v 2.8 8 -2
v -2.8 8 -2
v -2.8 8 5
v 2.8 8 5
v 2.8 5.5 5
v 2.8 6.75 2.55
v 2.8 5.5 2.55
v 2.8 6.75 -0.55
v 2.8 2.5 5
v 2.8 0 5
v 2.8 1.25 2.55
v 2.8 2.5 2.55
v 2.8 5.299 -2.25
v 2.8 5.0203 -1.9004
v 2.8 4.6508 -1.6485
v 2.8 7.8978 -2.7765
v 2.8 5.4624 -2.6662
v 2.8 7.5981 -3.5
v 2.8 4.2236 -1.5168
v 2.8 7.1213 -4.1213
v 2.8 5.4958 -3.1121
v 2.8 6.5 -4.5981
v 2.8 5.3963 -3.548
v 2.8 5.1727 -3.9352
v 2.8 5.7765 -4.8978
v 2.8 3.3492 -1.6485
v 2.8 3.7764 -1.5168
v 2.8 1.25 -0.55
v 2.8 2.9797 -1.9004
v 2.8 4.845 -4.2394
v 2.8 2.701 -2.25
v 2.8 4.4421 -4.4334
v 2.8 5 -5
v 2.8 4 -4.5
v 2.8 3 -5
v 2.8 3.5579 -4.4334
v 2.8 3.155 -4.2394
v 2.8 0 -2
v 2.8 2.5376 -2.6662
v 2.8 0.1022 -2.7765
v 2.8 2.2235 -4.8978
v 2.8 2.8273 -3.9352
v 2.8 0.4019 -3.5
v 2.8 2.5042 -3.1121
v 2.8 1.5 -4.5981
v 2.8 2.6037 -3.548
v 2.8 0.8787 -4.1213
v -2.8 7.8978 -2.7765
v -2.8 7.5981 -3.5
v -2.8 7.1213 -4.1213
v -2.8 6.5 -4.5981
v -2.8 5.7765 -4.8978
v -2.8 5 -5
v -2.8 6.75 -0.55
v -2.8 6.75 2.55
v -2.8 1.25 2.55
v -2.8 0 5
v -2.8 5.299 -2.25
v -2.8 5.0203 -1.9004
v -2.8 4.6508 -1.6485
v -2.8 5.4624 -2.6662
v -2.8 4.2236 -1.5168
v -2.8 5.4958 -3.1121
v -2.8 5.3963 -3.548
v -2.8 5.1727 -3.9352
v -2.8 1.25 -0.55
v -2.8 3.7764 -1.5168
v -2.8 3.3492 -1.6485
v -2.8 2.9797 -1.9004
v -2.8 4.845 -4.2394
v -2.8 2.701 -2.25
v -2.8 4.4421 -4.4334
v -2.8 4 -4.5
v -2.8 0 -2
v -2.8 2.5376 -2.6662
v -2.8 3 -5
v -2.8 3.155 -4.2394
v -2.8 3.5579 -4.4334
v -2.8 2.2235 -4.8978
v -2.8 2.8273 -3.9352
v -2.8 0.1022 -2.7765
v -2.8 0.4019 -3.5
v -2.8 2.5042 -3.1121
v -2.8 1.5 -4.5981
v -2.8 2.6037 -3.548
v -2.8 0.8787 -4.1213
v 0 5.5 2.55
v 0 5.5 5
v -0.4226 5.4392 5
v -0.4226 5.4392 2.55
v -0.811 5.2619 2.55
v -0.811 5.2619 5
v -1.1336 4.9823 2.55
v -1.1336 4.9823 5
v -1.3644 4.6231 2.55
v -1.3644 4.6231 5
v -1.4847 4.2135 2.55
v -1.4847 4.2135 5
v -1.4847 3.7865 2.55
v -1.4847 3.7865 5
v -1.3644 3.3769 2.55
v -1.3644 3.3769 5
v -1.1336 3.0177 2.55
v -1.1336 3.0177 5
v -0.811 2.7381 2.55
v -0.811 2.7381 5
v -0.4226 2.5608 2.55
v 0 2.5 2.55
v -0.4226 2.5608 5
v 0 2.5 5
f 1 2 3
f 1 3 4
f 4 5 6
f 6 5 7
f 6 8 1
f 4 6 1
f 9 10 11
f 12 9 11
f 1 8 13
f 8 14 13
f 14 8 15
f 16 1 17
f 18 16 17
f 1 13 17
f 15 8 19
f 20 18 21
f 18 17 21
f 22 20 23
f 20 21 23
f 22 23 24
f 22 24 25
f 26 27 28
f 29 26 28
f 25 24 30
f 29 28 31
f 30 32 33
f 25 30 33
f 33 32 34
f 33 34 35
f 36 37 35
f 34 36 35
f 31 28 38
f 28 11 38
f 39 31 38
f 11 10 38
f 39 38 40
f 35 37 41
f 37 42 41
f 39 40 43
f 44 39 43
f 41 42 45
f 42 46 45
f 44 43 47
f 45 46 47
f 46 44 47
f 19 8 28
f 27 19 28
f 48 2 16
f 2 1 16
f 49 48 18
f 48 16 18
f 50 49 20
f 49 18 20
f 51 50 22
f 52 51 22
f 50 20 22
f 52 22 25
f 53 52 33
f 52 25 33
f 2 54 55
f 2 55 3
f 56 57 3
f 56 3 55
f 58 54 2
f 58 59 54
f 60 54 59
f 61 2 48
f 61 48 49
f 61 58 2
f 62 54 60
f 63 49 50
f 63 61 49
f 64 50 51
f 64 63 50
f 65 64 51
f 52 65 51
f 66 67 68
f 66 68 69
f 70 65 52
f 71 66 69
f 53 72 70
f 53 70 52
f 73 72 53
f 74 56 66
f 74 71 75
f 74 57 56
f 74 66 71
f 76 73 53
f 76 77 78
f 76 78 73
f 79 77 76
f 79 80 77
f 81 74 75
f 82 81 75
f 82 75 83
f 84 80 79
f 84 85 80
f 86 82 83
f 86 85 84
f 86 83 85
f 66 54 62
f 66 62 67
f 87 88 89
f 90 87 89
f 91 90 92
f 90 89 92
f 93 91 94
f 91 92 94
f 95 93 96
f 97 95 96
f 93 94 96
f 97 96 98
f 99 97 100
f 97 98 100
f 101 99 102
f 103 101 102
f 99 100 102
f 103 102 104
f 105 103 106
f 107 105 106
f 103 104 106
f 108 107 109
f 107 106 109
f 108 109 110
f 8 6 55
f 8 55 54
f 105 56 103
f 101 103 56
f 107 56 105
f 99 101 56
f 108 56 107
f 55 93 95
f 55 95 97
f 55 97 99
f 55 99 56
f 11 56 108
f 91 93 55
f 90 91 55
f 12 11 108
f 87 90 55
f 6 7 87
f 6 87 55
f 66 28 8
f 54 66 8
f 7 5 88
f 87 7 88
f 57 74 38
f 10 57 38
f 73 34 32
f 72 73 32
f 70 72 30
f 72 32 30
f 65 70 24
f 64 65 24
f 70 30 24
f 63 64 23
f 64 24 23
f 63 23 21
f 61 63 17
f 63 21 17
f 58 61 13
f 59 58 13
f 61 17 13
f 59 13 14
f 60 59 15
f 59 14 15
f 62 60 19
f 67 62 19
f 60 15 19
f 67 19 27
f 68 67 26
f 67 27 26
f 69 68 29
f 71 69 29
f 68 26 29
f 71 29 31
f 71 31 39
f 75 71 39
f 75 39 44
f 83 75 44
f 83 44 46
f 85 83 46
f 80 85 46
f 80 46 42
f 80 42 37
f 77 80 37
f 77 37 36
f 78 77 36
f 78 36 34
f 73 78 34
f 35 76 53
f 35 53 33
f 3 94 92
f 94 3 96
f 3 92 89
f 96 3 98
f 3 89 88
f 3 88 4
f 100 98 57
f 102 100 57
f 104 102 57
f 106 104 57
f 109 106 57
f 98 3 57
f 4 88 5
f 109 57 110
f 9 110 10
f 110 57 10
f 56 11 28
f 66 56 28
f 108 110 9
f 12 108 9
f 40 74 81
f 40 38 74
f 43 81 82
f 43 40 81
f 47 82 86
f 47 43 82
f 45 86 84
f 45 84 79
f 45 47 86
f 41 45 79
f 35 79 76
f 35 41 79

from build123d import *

# Parameters (mm, degrees)
SKETCH_1_W          = 5.6
SKETCH_1_H          = 10
EXTRUDE_1_DEPTH     = 8
SKETCH_2_W          = 3.1
SKETCH_2_H          = 5.5
CUT_EXTRUDE_1_DEPTH = 11.970870522
CUT_EXTRUDE_2_REACH = 15.109
SKETCH_3_R          = 1.5
SKETCH_4_R          = 1.5
CUT_EXTRUDE_3_DEPTH = 11.970870522
FILLET_1_R          = 3


with BuildPart() as part:
    # 草图1 → 凸台-拉伸1 (new body)
    with BuildSketch(Plane(origin=(0, 0, 0), x_dir=(1, 0, 0), z_dir=(0, 1, 0))):
        Rectangle(SKETCH_1_W, SKETCH_1_H)
    extrude(amount=EXTRUDE_1_DEPTH)

    # 草图2 → 切除-拉伸1 (cut, through all)
    with BuildSketch(Plane(origin=(2.8, 0, 0), x_dir=(0, 0, -1), z_dir=(1, 0, 0))):
        with Locations((-1, 4)):
            Rectangle(SKETCH_2_W, SKETCH_2_H)
    extrude(amount=-CUT_EXTRUDE_1_DEPTH, mode=Mode.SUBTRACT)

    # 草图3 → 切除-拉伸2 (cut, up to next)
    with BuildSketch(Plane.XY.offset(5), mode=Mode.PRIVATE) as cut_extrude_2_sk1:
        with Locations((0, 4)):
            Circle(SKETCH_3_R)
    cut_extrude_2_tool1 = extrude(cut_extrude_2_sk1.sketch, amount=-CUT_EXTRUDE_2_REACH, mode=Mode.PRIVATE) & part.part
    # 草图3 → 切除-拉伸2 (cut, up to next)
    with BuildSketch(Plane.XY.offset(5), mode=Mode.PRIVATE) as cut_extrude_2_sk2:
        with BuildLine():
            Line((2.8, 5.5), (0, 5.5))
            ThreePointArc((0, 5.5), (1.060660172, 5.060660172), (1.5, 4))
            ThreePointArc((1.5, 4), (1.060660172, 2.939339828), (0, 2.5))
            Line((0, 2.5), (2.8, 2.5))
            Line((2.8, 2.5), (2.8, 5.5))
        make_face()
    cut_extrude_2_tool2 = extrude(cut_extrude_2_sk2.sketch, amount=-CUT_EXTRUDE_2_REACH, mode=Mode.PRIVATE) & part.part
    add(cut_extrude_2_tool1.solids().sort_by_distance((0, 4, 5))[0], mode=Mode.SUBTRACT)
    add(cut_extrude_2_tool2.solids().sort_by_distance((1.954494, 4, 5))[0], mode=Mode.SUBTRACT)

    # 草图4 → 切除-拉伸3 (cut, through all)
    with BuildSketch(Plane(origin=(2.8, 0, 0), x_dir=(0, 0, -1), z_dir=(1, 0, 0))):
        with Locations((3, 4)):
            Circle(SKETCH_4_R)
    extrude(amount=-CUT_EXTRUDE_3_DEPTH, mode=Mode.SUBTRACT)

    # 圆角1
    fillet_1_edges = [part.edges().sort_by_distance(p)[0] for p in [
        (0, 8, -5),
        (0, 0, -5),
    ]]
    fillet(fillet_1_edges, radius=FILLET_1_R)


solid = part.part
